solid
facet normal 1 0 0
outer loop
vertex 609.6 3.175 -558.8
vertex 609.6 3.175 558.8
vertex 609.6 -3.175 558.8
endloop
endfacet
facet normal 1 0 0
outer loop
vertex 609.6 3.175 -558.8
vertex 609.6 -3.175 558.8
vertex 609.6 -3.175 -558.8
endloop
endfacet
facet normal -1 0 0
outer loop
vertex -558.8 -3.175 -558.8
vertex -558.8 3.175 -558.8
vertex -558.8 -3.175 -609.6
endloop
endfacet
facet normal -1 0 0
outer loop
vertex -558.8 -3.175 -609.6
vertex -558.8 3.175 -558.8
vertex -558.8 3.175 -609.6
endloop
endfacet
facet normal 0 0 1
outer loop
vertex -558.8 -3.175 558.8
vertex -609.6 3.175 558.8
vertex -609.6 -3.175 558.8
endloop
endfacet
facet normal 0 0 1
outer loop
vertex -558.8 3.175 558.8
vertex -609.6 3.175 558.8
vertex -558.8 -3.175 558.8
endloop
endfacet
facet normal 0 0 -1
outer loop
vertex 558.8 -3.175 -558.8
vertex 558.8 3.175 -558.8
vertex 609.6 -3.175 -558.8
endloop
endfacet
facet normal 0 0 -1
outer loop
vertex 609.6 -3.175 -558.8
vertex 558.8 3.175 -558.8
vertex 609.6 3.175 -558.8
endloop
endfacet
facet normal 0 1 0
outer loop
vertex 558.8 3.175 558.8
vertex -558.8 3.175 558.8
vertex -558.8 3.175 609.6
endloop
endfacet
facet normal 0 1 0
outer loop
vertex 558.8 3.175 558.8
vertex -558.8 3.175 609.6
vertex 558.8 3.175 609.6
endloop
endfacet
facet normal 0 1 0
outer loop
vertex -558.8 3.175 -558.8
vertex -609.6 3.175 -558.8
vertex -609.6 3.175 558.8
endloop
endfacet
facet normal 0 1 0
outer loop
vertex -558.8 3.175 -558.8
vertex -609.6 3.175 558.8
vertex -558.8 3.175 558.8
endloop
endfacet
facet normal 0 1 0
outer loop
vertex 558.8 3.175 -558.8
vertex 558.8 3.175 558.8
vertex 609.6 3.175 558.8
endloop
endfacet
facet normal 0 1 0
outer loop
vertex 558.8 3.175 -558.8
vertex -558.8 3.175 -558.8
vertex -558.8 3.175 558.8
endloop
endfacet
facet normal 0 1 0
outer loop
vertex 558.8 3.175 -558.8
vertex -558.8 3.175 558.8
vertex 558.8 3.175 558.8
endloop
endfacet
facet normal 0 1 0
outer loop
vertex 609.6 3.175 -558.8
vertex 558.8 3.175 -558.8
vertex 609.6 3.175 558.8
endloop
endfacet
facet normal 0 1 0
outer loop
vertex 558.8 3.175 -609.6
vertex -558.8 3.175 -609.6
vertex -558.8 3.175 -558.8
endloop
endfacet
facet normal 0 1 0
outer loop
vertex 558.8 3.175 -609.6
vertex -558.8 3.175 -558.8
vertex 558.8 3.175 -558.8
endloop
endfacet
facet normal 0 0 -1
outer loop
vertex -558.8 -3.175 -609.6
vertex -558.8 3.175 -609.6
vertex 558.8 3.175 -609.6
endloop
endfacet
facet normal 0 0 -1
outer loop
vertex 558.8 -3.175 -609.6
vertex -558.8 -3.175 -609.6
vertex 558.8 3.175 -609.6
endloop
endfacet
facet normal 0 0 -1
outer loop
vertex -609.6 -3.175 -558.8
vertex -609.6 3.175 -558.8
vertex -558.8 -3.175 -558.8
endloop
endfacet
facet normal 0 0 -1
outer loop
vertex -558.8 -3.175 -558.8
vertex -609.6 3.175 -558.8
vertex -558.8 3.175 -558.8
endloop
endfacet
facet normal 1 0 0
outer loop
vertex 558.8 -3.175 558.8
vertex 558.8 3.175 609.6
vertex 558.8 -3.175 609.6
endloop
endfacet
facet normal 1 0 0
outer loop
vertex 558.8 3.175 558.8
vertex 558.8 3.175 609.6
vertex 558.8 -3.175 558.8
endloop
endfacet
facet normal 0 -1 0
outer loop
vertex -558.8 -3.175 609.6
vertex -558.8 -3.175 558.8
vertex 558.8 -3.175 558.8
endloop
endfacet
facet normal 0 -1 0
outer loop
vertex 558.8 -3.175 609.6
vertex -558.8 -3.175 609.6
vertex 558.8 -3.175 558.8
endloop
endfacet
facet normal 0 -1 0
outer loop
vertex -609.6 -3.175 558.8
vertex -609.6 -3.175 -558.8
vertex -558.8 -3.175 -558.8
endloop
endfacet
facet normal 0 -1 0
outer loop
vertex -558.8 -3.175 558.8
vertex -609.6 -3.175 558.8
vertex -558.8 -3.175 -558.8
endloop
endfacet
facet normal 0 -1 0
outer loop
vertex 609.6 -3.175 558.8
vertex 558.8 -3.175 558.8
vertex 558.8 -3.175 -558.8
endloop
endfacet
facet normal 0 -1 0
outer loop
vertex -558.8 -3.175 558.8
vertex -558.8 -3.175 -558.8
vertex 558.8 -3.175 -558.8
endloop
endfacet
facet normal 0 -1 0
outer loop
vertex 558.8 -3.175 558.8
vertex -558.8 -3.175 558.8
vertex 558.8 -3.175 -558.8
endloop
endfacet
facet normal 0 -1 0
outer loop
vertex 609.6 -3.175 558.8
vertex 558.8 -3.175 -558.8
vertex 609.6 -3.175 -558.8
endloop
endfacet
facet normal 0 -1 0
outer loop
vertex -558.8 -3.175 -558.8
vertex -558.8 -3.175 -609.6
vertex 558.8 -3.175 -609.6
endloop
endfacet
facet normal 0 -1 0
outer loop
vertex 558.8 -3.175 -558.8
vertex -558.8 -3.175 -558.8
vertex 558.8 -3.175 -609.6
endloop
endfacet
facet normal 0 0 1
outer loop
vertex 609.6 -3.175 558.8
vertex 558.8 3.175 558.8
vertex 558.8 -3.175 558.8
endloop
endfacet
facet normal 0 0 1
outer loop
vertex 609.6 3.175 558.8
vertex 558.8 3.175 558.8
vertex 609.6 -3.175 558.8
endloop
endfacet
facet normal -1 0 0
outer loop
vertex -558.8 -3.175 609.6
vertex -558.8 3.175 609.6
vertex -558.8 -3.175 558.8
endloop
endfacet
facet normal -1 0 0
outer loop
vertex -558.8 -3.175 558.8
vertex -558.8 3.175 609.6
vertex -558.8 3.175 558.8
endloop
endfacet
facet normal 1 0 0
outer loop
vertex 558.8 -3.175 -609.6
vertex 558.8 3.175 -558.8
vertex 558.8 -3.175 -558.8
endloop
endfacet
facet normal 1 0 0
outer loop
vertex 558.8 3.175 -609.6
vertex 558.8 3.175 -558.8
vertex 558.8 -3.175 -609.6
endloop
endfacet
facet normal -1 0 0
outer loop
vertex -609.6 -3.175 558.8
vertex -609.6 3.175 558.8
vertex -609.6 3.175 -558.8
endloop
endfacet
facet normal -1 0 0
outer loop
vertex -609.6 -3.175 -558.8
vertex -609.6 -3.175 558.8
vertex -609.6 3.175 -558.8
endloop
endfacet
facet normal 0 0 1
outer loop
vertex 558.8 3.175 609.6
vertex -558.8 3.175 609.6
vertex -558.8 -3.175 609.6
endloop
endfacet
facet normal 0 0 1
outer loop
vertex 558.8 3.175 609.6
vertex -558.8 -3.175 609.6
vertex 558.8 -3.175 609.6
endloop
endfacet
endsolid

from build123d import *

# Parameters (mm, degrees)
SKETCH1_W           = 1219.2
SKETCH1_H           = 1219.2
BOSS_EXTRUDE1_DEPTH = 3.175
SKETCH2_W           = 50.8
SKETCH2_H           = 50.8
CUT_EXTRUDE1_DEPTH  = 863.127973389


with BuildPart() as part:
    # Sketch1 → Boss-Extrude1 (new, symmetric)
    with BuildSketch(Plane(origin=(0, 0, 0), x_dir=(1, 0, 0), z_dir=(0, 1, 0))):
        Rectangle(SKETCH1_W, SKETCH1_H)
    extrude(amount=BOSS_EXTRUDE1_DEPTH, both=True)

    # Sketch2 → Cut-Extrude1 (cut, through all)
    with BuildSketch(Plane(origin=(0, 3.175, 0), x_dir=(1, 0, 0), z_dir=(0, 1, 0))):
        with Locations((-584.2, 584.2)):
            Rectangle(SKETCH2_W, SKETCH2_H)
        with Locations((584.2, 584.2)):
            Rectangle(SKETCH2_W, SKETCH2_H)
        with Locations((584.2, -584.2)):
            Rectangle(SKETCH2_W, SKETCH2_H)
        with Locations((-584.2, -584.2)):
            Rectangle(SKETCH2_W, SKETCH2_H)
    extrude(amount=-CUT_EXTRUDE1_DEPTH, mode=Mode.SUBTRACT)


solid = part.part
